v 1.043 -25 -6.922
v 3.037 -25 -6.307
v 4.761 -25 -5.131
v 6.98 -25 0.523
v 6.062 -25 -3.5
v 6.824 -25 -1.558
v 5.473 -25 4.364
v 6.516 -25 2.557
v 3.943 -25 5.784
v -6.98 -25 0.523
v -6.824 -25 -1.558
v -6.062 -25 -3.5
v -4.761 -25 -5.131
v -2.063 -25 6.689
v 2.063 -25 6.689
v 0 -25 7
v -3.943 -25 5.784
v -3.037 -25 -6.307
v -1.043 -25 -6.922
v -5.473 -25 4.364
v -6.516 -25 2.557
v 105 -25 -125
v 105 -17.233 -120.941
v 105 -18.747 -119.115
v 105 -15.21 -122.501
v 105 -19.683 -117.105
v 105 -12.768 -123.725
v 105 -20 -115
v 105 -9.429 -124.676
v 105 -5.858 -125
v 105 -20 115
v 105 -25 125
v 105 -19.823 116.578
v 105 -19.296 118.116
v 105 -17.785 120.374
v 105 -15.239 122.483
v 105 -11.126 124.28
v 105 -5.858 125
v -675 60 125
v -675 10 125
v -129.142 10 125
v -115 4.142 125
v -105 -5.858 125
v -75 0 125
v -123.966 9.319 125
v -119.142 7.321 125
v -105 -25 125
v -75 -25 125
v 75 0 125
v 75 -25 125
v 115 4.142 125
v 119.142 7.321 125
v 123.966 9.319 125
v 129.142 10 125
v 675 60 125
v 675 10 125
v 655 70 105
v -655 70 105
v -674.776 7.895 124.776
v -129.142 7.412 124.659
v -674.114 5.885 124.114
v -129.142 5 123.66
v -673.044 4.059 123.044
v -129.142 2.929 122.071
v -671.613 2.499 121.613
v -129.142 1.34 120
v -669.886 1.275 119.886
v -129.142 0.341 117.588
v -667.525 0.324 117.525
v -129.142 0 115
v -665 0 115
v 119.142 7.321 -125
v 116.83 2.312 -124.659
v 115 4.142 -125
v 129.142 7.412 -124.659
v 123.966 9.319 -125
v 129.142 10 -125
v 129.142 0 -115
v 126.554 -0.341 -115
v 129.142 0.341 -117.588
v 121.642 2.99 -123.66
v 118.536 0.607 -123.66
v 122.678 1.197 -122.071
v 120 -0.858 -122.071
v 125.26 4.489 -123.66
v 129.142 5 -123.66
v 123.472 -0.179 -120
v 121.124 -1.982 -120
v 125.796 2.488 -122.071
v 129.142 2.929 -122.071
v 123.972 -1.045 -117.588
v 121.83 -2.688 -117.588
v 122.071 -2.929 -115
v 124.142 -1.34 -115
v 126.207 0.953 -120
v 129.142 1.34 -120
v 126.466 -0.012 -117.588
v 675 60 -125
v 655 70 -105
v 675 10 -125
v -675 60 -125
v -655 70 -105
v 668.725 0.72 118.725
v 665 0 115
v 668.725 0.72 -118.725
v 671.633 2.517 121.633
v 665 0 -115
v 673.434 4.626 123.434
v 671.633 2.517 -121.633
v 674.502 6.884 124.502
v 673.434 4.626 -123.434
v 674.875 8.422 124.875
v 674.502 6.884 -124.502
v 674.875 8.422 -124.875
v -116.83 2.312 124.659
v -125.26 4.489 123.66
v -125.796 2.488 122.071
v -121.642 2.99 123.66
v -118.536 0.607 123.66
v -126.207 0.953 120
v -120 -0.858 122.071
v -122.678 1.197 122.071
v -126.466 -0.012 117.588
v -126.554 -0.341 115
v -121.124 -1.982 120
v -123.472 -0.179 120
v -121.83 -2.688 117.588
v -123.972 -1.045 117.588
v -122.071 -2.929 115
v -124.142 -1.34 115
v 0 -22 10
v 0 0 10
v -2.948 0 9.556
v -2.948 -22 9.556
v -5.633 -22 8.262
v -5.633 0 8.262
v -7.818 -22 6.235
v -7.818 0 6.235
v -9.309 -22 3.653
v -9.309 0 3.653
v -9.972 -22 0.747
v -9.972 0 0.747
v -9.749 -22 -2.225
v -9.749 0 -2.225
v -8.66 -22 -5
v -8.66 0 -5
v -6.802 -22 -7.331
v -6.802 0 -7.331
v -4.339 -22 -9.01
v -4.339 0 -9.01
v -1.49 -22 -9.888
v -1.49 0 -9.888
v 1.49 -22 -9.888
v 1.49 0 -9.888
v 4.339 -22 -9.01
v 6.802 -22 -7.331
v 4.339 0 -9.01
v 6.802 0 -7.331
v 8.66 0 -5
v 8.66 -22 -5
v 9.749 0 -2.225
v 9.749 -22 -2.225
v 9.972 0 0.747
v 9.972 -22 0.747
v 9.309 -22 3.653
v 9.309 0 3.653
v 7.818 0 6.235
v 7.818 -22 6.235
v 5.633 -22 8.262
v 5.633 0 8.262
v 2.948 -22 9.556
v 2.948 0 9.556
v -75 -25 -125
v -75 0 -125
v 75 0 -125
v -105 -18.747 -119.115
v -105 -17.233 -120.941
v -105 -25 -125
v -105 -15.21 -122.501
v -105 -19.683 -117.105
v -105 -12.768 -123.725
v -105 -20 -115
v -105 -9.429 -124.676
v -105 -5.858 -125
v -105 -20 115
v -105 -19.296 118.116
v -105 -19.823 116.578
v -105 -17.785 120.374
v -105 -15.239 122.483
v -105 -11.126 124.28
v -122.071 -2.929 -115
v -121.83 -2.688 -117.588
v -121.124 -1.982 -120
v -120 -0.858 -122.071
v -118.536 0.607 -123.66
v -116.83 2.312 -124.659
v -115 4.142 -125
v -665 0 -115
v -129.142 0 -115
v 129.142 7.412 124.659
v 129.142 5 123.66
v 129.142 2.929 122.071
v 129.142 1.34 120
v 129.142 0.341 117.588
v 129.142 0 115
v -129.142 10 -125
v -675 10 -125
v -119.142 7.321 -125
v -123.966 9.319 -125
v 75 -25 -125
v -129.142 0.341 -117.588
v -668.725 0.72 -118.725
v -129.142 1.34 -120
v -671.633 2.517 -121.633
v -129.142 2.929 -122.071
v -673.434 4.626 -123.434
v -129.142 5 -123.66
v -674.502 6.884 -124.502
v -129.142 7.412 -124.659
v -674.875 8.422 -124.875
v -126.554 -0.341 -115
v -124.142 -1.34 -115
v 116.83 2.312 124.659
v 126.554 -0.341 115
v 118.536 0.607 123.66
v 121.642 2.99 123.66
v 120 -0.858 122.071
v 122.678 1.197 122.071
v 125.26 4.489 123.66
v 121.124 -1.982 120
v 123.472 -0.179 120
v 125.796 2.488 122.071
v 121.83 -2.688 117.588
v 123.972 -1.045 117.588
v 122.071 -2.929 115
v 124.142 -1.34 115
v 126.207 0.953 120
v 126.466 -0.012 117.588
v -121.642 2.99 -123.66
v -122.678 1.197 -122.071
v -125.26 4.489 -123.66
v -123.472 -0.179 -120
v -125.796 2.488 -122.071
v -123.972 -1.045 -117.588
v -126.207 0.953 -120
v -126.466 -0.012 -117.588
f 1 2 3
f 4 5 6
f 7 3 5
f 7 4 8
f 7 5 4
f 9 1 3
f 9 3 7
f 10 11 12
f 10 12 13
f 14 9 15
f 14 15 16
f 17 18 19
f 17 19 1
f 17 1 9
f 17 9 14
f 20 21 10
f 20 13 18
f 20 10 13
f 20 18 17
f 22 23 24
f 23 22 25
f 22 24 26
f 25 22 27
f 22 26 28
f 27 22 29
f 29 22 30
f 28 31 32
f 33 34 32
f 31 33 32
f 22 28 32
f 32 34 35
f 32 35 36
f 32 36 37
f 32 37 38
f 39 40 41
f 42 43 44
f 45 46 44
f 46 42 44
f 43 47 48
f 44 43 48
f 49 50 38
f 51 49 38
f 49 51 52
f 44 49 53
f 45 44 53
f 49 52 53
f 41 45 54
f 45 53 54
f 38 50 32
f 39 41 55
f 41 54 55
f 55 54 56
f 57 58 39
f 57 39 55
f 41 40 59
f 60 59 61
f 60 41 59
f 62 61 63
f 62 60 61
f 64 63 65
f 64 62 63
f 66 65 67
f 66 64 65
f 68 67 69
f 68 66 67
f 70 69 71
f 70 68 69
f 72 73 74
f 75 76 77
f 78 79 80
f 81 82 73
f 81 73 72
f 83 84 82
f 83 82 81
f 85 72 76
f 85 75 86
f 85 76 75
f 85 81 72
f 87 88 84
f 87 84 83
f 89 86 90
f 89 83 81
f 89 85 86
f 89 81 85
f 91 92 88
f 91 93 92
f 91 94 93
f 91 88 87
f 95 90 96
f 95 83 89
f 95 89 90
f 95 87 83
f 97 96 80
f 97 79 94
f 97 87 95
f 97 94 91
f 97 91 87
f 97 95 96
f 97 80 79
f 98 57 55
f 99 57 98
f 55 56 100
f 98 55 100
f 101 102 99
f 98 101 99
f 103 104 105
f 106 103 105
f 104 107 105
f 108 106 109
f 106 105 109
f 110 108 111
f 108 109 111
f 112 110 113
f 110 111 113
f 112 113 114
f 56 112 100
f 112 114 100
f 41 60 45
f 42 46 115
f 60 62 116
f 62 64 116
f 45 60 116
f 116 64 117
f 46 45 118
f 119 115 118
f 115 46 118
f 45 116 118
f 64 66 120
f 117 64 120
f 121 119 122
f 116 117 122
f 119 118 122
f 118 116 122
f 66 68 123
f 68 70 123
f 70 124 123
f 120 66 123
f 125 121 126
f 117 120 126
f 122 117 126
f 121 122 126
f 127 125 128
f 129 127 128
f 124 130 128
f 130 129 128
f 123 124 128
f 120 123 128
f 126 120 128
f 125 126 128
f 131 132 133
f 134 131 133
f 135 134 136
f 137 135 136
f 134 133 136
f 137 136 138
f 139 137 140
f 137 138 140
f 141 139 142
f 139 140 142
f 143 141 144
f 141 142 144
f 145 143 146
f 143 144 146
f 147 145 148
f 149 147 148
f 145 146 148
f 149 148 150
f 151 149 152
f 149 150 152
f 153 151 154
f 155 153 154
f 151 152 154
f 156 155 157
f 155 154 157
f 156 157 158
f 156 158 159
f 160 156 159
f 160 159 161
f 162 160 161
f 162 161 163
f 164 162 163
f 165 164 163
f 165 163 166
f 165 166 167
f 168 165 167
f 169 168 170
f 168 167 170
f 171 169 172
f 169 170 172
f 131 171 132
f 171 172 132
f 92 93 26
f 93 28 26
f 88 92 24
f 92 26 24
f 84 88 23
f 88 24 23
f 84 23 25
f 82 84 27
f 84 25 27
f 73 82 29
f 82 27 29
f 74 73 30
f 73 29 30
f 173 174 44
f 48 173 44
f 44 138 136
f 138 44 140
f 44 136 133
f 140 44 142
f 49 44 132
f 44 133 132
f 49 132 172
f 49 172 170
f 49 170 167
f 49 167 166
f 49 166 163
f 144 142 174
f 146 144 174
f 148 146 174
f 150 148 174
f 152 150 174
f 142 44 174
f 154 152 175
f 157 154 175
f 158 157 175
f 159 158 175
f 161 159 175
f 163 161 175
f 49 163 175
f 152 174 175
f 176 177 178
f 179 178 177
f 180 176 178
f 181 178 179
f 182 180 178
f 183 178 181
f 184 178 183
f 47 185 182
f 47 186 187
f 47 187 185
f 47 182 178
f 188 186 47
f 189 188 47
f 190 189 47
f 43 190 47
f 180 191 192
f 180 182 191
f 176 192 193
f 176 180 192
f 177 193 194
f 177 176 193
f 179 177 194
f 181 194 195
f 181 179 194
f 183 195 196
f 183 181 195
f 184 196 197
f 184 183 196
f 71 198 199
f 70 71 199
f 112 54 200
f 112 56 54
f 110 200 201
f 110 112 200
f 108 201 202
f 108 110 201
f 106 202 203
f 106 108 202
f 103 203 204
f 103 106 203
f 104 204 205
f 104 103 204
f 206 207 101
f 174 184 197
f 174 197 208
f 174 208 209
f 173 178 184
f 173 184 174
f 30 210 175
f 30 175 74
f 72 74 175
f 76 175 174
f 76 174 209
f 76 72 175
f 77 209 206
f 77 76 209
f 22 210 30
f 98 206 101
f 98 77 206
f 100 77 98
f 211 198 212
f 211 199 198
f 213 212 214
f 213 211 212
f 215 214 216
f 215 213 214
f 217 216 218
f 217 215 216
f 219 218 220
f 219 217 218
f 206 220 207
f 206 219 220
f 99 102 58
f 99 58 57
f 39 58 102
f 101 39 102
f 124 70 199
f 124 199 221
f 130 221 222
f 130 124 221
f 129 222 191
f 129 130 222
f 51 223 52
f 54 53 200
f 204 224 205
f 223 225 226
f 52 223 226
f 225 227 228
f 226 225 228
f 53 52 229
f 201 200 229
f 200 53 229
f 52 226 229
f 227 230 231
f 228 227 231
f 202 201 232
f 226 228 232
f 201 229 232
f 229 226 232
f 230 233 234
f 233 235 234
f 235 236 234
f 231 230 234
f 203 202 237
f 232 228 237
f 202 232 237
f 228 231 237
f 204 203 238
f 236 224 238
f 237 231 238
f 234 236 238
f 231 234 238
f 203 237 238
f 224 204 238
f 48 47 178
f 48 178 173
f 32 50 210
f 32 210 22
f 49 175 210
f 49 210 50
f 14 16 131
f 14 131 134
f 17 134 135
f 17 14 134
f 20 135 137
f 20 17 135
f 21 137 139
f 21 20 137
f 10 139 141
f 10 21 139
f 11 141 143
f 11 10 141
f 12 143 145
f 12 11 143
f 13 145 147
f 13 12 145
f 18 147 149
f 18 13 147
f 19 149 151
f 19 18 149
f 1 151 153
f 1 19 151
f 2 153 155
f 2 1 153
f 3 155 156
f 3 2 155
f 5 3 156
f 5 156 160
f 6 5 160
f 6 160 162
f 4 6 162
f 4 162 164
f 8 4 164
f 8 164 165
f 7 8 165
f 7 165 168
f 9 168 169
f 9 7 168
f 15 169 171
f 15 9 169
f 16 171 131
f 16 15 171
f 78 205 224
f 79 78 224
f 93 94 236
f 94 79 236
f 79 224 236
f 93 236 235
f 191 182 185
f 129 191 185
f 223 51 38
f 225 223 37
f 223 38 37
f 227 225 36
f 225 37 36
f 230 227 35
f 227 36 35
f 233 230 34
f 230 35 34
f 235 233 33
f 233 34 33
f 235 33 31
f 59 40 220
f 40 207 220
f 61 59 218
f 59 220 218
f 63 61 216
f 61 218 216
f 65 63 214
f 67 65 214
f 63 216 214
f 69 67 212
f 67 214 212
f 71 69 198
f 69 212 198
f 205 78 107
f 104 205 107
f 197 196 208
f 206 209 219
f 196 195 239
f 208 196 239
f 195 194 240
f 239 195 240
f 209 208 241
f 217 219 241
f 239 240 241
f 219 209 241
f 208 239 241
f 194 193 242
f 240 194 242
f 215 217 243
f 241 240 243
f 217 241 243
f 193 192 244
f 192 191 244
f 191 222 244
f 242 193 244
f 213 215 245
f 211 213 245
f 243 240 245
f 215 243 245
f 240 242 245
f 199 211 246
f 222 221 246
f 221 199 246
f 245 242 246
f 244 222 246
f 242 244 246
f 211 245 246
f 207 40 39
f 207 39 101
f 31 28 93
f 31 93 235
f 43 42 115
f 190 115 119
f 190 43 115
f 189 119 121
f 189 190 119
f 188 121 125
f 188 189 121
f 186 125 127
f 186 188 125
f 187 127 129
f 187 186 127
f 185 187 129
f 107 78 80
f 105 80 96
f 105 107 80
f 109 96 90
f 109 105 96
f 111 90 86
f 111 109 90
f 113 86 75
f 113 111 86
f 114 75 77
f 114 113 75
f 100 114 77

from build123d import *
from OCP.BRepFilletAPI import BRepFilletAPI_MakeChamfer

# Parameters (mm, degrees)
SKETCH1_W           = 1350
SKETCH1_H           = 250
BOSS_EXTRUDE1_DEPTH = 70
CHAMFER1_SIZE       = 10
CHAMFER1_SIZE2      = 20
SKETCH2_W           = 30
SKETCH2_H           = 250
BOSS_EXTRUDE2_DEPTH = 25
CHAMFER2_SIZE       = 20
FILLET1_R           = 10
SKETCH3_R           = 10
BOSS_EXTRUDE3_DEPTH = 25
CHAMFER3_SIZE       = 3


with BuildPart() as part:
    # Sketch1 → Boss-Extrude1 (new body)
    with BuildSketch(Plane(origin=(0, 0, 0), x_dir=(1, 0, 0), z_dir=(0, 1, 0))):
        Rectangle(SKETCH1_W, SKETCH1_H)
    extrude(amount=BOSS_EXTRUDE1_DEPTH)

    # Chamfer1: one chamfer whose edges measure the first distance from different faces: ONE call of the kernel's chamfer builder (chamfer() names one face for all edges)
    chamfer1_edges_1 = [part.edges().sort_by_distance(p)[0] for p in [
        (675, 70, 0),
    ]]
    chamfer1_side_1 = [part.faces().sort_by_distance(p)[0] for p in [
        (675, 35, 0),
    ]]
    chamfer1_edges_2 = [part.edges().sort_by_distance(p)[0] for p in [
        (0, 70, -125),
    ]]
    chamfer1_side_2 = [part.faces().sort_by_distance(p)[0] for p in [
        (0, 35, -125),
    ]]
    chamfer1_edges_3 = [part.edges().sort_by_distance(p)[0] for p in [
        (-675, 70, 0),
    ]]
    chamfer1_side_3 = [part.faces().sort_by_distance(p)[0] for p in [
        (-675, 35, 0),
    ]]
    chamfer1_edges_4 = [part.edges().sort_by_distance(p)[0] for p in [
        (0, 70, 125),
    ]]
    chamfer1_side_4 = [part.faces().sort_by_distance(p)[0] for p in [
        (0, 35, 125),
    ]]
    chamfer1 = BRepFilletAPI_MakeChamfer(part.part.solid().wrapped)
    for e in chamfer1_edges_1:
        chamfer1.Add(CHAMFER1_SIZE, CHAMFER1_SIZE2, e.wrapped, chamfer1_side_1[0].wrapped)  # the first distance lies on this face
    for e in chamfer1_edges_2:
        chamfer1.Add(CHAMFER1_SIZE, CHAMFER1_SIZE2, e.wrapped, chamfer1_side_2[0].wrapped)  # the first distance lies on this face
    for e in chamfer1_edges_3:
        chamfer1.Add(CHAMFER1_SIZE, CHAMFER1_SIZE2, e.wrapped, chamfer1_side_3[0].wrapped)  # the first distance lies on this face
    for e in chamfer1_edges_4:
        chamfer1.Add(CHAMFER1_SIZE, CHAMFER1_SIZE2, e.wrapped, chamfer1_side_4[0].wrapped)  # the first distance lies on this face
    add(Compound.cast(chamfer1.Shape()), mode=Mode.REPLACE)

    # Sketch2 → Boss-Extrude2 (add)
    with BuildSketch(Plane.XZ):
        with Locations((-90, 0)):
            Rectangle(SKETCH2_W, SKETCH2_H)
        with Locations((90, 0)):
            Rectangle(SKETCH2_W, SKETCH2_H)
    extrude(amount=BOSS_EXTRUDE2_DEPTH)

    # Chamfer2
    chamfer2_edges = [part.edges().sort_by_distance(p)[0] for p in [
        (-105, 0, 0),
        (105, 0, 0),
    ]]
    chamfer(chamfer2_edges, length=CHAMFER2_SIZE)

    # Fillet1
    fillet1_edges = [part.edges().sort_by_distance(p)[0] for p in [
        (-400, 0, -125),
        (675, 0, 0),
        (-125, 0, 0),
        (400, 0, -125),
        (400, 0, 125),
        (-400, 0, 125),
        (125, 0, 0),
        (-115, -10, -125),
        (-115, -10, 125),
        (115, -10, 125),
        (115, -10, -125),
        (-675, 0, 0),
    ]]
    fillet(fillet1_edges, radius=FILLET1_R)

    # Sketch3 → Boss-Extrude3 (add)
    with BuildSketch(Plane.XZ):
        with Locations(Location((0, 0, 0), (0, 0, 90))):
            Circle(SKETCH3_R)
    extrude(amount=BOSS_EXTRUDE3_DEPTH)

    # Chamfer3
    chamfer3_edges = [part.edges().sort_by_distance(p)[0] for p in [
        (0, -25, -10),
    ]]
    chamfer(chamfer3_edges, length=CHAMFER3_SIZE)


solid = part.part
